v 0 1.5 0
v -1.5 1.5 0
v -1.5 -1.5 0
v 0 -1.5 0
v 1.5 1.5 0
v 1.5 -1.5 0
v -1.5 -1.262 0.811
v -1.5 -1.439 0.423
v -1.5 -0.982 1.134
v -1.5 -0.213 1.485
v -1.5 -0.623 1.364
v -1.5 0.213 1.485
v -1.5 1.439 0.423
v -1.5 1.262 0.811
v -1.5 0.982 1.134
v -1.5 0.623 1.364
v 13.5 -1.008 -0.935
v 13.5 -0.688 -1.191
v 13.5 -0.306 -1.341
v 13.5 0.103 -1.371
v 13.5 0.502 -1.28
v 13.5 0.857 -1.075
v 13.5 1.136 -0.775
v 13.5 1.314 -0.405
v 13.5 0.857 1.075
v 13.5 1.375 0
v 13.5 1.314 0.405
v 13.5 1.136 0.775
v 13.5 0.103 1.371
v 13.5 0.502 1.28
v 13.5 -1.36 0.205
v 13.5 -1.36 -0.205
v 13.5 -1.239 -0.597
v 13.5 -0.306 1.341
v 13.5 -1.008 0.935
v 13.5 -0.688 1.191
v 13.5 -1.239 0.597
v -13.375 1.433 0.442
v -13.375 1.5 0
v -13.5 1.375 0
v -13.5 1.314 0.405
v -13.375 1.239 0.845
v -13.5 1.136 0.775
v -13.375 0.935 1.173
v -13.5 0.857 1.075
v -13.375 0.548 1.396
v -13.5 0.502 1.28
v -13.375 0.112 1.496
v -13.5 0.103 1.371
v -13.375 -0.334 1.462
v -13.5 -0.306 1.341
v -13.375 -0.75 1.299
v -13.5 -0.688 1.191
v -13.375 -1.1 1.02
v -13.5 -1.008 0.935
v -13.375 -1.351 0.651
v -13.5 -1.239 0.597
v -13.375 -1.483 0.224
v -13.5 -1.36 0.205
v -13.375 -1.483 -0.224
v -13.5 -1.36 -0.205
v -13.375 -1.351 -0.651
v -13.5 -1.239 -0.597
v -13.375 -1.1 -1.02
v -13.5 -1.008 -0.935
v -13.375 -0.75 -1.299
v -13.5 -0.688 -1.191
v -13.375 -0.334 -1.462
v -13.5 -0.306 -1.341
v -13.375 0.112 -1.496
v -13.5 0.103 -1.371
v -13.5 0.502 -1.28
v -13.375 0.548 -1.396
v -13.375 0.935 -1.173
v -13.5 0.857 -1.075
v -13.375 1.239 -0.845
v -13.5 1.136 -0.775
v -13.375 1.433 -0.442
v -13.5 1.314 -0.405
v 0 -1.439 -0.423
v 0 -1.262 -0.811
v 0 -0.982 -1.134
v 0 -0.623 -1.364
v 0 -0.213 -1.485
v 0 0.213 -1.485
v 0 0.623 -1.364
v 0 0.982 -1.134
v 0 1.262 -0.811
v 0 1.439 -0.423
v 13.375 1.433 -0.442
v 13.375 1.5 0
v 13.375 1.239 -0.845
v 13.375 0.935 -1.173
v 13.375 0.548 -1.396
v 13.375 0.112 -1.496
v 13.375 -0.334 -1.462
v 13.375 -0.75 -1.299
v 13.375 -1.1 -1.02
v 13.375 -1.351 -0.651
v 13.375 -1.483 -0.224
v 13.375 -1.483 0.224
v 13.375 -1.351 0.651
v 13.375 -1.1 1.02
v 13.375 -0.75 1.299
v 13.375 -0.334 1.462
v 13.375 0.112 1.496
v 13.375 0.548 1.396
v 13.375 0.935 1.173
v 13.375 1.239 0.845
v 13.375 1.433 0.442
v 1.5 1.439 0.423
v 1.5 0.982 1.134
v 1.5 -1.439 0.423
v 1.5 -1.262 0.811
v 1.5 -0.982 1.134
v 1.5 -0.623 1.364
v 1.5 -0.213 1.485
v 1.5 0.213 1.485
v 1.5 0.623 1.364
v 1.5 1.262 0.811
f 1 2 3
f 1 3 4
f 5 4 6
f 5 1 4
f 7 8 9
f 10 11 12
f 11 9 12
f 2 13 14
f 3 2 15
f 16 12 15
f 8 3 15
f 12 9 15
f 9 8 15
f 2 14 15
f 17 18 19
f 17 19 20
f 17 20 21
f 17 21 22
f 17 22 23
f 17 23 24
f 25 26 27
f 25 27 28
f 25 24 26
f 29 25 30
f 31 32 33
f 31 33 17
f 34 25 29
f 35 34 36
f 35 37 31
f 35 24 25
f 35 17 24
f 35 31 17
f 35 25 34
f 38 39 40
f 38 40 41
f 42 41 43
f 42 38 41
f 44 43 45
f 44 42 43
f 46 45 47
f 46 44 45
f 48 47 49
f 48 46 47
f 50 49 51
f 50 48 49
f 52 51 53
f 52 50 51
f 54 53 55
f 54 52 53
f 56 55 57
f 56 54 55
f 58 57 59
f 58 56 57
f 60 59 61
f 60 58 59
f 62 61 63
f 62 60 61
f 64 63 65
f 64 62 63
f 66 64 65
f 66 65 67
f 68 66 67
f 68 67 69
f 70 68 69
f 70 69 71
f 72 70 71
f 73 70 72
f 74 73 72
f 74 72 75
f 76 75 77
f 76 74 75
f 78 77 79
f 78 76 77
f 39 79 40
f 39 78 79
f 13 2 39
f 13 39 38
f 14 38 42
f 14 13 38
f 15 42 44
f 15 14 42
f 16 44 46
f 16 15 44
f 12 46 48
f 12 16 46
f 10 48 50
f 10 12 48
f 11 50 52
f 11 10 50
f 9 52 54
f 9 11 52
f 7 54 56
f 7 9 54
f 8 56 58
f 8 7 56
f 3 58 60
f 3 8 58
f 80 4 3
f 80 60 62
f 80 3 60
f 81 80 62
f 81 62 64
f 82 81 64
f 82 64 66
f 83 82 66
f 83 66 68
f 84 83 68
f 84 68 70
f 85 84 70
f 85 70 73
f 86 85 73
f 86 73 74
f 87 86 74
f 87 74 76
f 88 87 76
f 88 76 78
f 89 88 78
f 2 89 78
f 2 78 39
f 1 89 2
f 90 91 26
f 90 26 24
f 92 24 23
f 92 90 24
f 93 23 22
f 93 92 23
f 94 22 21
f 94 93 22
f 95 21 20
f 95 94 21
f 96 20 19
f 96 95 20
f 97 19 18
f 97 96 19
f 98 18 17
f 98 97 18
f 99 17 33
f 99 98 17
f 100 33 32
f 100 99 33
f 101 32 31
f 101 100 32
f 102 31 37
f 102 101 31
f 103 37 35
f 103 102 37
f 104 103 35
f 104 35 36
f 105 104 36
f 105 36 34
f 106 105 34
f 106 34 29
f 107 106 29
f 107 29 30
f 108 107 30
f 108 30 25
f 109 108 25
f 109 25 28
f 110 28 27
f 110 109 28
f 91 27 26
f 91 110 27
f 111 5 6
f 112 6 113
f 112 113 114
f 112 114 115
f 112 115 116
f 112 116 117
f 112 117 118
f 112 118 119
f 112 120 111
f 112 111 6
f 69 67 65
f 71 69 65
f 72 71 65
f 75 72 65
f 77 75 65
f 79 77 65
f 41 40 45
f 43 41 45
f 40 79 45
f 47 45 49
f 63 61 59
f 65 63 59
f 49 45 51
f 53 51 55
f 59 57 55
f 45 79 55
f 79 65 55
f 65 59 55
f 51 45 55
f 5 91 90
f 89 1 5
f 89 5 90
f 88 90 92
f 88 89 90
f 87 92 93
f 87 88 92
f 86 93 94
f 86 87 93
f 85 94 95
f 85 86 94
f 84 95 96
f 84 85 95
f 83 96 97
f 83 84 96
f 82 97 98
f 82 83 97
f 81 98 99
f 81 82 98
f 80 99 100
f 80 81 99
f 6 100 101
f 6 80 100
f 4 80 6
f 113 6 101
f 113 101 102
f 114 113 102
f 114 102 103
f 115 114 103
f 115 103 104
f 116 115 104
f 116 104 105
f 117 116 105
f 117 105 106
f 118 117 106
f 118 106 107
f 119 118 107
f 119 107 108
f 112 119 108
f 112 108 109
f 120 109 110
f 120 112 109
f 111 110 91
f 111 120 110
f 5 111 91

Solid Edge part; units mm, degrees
sketch "Sketch1" plane through (0, 0, 0) normal (1, 0, 0) x (0, 1, 0)
  circle A0 centre (0, 0) radius 1.5
  dimension "D1" = 3
extrude "Protrusion1" add sketch "Sketch1" along normal mid plane 27
sketch "Sketch2" plane through (0, 0, 0) normal (0, -1, 0) x (1, 0, 0)
  line L0 (-1.5, 1.5) -> (-1.5, 0)
  line L1 (-1.5, 0) -> (1.5, 0)
  line L2 (1.5, 0) -> (1.5, 1.5)
  dimension "D1" = 3
extrude "Extrusionsausschnitt_1" cut sketch "Sketch2" along normal mid plane 28 material side at (-1.45, 0, 0.75)
chamfer "Fase_1" distance 0.125 angle 45 2 edges at (13.5, -1.5, 0) (-13.5, -1.5, 0)
